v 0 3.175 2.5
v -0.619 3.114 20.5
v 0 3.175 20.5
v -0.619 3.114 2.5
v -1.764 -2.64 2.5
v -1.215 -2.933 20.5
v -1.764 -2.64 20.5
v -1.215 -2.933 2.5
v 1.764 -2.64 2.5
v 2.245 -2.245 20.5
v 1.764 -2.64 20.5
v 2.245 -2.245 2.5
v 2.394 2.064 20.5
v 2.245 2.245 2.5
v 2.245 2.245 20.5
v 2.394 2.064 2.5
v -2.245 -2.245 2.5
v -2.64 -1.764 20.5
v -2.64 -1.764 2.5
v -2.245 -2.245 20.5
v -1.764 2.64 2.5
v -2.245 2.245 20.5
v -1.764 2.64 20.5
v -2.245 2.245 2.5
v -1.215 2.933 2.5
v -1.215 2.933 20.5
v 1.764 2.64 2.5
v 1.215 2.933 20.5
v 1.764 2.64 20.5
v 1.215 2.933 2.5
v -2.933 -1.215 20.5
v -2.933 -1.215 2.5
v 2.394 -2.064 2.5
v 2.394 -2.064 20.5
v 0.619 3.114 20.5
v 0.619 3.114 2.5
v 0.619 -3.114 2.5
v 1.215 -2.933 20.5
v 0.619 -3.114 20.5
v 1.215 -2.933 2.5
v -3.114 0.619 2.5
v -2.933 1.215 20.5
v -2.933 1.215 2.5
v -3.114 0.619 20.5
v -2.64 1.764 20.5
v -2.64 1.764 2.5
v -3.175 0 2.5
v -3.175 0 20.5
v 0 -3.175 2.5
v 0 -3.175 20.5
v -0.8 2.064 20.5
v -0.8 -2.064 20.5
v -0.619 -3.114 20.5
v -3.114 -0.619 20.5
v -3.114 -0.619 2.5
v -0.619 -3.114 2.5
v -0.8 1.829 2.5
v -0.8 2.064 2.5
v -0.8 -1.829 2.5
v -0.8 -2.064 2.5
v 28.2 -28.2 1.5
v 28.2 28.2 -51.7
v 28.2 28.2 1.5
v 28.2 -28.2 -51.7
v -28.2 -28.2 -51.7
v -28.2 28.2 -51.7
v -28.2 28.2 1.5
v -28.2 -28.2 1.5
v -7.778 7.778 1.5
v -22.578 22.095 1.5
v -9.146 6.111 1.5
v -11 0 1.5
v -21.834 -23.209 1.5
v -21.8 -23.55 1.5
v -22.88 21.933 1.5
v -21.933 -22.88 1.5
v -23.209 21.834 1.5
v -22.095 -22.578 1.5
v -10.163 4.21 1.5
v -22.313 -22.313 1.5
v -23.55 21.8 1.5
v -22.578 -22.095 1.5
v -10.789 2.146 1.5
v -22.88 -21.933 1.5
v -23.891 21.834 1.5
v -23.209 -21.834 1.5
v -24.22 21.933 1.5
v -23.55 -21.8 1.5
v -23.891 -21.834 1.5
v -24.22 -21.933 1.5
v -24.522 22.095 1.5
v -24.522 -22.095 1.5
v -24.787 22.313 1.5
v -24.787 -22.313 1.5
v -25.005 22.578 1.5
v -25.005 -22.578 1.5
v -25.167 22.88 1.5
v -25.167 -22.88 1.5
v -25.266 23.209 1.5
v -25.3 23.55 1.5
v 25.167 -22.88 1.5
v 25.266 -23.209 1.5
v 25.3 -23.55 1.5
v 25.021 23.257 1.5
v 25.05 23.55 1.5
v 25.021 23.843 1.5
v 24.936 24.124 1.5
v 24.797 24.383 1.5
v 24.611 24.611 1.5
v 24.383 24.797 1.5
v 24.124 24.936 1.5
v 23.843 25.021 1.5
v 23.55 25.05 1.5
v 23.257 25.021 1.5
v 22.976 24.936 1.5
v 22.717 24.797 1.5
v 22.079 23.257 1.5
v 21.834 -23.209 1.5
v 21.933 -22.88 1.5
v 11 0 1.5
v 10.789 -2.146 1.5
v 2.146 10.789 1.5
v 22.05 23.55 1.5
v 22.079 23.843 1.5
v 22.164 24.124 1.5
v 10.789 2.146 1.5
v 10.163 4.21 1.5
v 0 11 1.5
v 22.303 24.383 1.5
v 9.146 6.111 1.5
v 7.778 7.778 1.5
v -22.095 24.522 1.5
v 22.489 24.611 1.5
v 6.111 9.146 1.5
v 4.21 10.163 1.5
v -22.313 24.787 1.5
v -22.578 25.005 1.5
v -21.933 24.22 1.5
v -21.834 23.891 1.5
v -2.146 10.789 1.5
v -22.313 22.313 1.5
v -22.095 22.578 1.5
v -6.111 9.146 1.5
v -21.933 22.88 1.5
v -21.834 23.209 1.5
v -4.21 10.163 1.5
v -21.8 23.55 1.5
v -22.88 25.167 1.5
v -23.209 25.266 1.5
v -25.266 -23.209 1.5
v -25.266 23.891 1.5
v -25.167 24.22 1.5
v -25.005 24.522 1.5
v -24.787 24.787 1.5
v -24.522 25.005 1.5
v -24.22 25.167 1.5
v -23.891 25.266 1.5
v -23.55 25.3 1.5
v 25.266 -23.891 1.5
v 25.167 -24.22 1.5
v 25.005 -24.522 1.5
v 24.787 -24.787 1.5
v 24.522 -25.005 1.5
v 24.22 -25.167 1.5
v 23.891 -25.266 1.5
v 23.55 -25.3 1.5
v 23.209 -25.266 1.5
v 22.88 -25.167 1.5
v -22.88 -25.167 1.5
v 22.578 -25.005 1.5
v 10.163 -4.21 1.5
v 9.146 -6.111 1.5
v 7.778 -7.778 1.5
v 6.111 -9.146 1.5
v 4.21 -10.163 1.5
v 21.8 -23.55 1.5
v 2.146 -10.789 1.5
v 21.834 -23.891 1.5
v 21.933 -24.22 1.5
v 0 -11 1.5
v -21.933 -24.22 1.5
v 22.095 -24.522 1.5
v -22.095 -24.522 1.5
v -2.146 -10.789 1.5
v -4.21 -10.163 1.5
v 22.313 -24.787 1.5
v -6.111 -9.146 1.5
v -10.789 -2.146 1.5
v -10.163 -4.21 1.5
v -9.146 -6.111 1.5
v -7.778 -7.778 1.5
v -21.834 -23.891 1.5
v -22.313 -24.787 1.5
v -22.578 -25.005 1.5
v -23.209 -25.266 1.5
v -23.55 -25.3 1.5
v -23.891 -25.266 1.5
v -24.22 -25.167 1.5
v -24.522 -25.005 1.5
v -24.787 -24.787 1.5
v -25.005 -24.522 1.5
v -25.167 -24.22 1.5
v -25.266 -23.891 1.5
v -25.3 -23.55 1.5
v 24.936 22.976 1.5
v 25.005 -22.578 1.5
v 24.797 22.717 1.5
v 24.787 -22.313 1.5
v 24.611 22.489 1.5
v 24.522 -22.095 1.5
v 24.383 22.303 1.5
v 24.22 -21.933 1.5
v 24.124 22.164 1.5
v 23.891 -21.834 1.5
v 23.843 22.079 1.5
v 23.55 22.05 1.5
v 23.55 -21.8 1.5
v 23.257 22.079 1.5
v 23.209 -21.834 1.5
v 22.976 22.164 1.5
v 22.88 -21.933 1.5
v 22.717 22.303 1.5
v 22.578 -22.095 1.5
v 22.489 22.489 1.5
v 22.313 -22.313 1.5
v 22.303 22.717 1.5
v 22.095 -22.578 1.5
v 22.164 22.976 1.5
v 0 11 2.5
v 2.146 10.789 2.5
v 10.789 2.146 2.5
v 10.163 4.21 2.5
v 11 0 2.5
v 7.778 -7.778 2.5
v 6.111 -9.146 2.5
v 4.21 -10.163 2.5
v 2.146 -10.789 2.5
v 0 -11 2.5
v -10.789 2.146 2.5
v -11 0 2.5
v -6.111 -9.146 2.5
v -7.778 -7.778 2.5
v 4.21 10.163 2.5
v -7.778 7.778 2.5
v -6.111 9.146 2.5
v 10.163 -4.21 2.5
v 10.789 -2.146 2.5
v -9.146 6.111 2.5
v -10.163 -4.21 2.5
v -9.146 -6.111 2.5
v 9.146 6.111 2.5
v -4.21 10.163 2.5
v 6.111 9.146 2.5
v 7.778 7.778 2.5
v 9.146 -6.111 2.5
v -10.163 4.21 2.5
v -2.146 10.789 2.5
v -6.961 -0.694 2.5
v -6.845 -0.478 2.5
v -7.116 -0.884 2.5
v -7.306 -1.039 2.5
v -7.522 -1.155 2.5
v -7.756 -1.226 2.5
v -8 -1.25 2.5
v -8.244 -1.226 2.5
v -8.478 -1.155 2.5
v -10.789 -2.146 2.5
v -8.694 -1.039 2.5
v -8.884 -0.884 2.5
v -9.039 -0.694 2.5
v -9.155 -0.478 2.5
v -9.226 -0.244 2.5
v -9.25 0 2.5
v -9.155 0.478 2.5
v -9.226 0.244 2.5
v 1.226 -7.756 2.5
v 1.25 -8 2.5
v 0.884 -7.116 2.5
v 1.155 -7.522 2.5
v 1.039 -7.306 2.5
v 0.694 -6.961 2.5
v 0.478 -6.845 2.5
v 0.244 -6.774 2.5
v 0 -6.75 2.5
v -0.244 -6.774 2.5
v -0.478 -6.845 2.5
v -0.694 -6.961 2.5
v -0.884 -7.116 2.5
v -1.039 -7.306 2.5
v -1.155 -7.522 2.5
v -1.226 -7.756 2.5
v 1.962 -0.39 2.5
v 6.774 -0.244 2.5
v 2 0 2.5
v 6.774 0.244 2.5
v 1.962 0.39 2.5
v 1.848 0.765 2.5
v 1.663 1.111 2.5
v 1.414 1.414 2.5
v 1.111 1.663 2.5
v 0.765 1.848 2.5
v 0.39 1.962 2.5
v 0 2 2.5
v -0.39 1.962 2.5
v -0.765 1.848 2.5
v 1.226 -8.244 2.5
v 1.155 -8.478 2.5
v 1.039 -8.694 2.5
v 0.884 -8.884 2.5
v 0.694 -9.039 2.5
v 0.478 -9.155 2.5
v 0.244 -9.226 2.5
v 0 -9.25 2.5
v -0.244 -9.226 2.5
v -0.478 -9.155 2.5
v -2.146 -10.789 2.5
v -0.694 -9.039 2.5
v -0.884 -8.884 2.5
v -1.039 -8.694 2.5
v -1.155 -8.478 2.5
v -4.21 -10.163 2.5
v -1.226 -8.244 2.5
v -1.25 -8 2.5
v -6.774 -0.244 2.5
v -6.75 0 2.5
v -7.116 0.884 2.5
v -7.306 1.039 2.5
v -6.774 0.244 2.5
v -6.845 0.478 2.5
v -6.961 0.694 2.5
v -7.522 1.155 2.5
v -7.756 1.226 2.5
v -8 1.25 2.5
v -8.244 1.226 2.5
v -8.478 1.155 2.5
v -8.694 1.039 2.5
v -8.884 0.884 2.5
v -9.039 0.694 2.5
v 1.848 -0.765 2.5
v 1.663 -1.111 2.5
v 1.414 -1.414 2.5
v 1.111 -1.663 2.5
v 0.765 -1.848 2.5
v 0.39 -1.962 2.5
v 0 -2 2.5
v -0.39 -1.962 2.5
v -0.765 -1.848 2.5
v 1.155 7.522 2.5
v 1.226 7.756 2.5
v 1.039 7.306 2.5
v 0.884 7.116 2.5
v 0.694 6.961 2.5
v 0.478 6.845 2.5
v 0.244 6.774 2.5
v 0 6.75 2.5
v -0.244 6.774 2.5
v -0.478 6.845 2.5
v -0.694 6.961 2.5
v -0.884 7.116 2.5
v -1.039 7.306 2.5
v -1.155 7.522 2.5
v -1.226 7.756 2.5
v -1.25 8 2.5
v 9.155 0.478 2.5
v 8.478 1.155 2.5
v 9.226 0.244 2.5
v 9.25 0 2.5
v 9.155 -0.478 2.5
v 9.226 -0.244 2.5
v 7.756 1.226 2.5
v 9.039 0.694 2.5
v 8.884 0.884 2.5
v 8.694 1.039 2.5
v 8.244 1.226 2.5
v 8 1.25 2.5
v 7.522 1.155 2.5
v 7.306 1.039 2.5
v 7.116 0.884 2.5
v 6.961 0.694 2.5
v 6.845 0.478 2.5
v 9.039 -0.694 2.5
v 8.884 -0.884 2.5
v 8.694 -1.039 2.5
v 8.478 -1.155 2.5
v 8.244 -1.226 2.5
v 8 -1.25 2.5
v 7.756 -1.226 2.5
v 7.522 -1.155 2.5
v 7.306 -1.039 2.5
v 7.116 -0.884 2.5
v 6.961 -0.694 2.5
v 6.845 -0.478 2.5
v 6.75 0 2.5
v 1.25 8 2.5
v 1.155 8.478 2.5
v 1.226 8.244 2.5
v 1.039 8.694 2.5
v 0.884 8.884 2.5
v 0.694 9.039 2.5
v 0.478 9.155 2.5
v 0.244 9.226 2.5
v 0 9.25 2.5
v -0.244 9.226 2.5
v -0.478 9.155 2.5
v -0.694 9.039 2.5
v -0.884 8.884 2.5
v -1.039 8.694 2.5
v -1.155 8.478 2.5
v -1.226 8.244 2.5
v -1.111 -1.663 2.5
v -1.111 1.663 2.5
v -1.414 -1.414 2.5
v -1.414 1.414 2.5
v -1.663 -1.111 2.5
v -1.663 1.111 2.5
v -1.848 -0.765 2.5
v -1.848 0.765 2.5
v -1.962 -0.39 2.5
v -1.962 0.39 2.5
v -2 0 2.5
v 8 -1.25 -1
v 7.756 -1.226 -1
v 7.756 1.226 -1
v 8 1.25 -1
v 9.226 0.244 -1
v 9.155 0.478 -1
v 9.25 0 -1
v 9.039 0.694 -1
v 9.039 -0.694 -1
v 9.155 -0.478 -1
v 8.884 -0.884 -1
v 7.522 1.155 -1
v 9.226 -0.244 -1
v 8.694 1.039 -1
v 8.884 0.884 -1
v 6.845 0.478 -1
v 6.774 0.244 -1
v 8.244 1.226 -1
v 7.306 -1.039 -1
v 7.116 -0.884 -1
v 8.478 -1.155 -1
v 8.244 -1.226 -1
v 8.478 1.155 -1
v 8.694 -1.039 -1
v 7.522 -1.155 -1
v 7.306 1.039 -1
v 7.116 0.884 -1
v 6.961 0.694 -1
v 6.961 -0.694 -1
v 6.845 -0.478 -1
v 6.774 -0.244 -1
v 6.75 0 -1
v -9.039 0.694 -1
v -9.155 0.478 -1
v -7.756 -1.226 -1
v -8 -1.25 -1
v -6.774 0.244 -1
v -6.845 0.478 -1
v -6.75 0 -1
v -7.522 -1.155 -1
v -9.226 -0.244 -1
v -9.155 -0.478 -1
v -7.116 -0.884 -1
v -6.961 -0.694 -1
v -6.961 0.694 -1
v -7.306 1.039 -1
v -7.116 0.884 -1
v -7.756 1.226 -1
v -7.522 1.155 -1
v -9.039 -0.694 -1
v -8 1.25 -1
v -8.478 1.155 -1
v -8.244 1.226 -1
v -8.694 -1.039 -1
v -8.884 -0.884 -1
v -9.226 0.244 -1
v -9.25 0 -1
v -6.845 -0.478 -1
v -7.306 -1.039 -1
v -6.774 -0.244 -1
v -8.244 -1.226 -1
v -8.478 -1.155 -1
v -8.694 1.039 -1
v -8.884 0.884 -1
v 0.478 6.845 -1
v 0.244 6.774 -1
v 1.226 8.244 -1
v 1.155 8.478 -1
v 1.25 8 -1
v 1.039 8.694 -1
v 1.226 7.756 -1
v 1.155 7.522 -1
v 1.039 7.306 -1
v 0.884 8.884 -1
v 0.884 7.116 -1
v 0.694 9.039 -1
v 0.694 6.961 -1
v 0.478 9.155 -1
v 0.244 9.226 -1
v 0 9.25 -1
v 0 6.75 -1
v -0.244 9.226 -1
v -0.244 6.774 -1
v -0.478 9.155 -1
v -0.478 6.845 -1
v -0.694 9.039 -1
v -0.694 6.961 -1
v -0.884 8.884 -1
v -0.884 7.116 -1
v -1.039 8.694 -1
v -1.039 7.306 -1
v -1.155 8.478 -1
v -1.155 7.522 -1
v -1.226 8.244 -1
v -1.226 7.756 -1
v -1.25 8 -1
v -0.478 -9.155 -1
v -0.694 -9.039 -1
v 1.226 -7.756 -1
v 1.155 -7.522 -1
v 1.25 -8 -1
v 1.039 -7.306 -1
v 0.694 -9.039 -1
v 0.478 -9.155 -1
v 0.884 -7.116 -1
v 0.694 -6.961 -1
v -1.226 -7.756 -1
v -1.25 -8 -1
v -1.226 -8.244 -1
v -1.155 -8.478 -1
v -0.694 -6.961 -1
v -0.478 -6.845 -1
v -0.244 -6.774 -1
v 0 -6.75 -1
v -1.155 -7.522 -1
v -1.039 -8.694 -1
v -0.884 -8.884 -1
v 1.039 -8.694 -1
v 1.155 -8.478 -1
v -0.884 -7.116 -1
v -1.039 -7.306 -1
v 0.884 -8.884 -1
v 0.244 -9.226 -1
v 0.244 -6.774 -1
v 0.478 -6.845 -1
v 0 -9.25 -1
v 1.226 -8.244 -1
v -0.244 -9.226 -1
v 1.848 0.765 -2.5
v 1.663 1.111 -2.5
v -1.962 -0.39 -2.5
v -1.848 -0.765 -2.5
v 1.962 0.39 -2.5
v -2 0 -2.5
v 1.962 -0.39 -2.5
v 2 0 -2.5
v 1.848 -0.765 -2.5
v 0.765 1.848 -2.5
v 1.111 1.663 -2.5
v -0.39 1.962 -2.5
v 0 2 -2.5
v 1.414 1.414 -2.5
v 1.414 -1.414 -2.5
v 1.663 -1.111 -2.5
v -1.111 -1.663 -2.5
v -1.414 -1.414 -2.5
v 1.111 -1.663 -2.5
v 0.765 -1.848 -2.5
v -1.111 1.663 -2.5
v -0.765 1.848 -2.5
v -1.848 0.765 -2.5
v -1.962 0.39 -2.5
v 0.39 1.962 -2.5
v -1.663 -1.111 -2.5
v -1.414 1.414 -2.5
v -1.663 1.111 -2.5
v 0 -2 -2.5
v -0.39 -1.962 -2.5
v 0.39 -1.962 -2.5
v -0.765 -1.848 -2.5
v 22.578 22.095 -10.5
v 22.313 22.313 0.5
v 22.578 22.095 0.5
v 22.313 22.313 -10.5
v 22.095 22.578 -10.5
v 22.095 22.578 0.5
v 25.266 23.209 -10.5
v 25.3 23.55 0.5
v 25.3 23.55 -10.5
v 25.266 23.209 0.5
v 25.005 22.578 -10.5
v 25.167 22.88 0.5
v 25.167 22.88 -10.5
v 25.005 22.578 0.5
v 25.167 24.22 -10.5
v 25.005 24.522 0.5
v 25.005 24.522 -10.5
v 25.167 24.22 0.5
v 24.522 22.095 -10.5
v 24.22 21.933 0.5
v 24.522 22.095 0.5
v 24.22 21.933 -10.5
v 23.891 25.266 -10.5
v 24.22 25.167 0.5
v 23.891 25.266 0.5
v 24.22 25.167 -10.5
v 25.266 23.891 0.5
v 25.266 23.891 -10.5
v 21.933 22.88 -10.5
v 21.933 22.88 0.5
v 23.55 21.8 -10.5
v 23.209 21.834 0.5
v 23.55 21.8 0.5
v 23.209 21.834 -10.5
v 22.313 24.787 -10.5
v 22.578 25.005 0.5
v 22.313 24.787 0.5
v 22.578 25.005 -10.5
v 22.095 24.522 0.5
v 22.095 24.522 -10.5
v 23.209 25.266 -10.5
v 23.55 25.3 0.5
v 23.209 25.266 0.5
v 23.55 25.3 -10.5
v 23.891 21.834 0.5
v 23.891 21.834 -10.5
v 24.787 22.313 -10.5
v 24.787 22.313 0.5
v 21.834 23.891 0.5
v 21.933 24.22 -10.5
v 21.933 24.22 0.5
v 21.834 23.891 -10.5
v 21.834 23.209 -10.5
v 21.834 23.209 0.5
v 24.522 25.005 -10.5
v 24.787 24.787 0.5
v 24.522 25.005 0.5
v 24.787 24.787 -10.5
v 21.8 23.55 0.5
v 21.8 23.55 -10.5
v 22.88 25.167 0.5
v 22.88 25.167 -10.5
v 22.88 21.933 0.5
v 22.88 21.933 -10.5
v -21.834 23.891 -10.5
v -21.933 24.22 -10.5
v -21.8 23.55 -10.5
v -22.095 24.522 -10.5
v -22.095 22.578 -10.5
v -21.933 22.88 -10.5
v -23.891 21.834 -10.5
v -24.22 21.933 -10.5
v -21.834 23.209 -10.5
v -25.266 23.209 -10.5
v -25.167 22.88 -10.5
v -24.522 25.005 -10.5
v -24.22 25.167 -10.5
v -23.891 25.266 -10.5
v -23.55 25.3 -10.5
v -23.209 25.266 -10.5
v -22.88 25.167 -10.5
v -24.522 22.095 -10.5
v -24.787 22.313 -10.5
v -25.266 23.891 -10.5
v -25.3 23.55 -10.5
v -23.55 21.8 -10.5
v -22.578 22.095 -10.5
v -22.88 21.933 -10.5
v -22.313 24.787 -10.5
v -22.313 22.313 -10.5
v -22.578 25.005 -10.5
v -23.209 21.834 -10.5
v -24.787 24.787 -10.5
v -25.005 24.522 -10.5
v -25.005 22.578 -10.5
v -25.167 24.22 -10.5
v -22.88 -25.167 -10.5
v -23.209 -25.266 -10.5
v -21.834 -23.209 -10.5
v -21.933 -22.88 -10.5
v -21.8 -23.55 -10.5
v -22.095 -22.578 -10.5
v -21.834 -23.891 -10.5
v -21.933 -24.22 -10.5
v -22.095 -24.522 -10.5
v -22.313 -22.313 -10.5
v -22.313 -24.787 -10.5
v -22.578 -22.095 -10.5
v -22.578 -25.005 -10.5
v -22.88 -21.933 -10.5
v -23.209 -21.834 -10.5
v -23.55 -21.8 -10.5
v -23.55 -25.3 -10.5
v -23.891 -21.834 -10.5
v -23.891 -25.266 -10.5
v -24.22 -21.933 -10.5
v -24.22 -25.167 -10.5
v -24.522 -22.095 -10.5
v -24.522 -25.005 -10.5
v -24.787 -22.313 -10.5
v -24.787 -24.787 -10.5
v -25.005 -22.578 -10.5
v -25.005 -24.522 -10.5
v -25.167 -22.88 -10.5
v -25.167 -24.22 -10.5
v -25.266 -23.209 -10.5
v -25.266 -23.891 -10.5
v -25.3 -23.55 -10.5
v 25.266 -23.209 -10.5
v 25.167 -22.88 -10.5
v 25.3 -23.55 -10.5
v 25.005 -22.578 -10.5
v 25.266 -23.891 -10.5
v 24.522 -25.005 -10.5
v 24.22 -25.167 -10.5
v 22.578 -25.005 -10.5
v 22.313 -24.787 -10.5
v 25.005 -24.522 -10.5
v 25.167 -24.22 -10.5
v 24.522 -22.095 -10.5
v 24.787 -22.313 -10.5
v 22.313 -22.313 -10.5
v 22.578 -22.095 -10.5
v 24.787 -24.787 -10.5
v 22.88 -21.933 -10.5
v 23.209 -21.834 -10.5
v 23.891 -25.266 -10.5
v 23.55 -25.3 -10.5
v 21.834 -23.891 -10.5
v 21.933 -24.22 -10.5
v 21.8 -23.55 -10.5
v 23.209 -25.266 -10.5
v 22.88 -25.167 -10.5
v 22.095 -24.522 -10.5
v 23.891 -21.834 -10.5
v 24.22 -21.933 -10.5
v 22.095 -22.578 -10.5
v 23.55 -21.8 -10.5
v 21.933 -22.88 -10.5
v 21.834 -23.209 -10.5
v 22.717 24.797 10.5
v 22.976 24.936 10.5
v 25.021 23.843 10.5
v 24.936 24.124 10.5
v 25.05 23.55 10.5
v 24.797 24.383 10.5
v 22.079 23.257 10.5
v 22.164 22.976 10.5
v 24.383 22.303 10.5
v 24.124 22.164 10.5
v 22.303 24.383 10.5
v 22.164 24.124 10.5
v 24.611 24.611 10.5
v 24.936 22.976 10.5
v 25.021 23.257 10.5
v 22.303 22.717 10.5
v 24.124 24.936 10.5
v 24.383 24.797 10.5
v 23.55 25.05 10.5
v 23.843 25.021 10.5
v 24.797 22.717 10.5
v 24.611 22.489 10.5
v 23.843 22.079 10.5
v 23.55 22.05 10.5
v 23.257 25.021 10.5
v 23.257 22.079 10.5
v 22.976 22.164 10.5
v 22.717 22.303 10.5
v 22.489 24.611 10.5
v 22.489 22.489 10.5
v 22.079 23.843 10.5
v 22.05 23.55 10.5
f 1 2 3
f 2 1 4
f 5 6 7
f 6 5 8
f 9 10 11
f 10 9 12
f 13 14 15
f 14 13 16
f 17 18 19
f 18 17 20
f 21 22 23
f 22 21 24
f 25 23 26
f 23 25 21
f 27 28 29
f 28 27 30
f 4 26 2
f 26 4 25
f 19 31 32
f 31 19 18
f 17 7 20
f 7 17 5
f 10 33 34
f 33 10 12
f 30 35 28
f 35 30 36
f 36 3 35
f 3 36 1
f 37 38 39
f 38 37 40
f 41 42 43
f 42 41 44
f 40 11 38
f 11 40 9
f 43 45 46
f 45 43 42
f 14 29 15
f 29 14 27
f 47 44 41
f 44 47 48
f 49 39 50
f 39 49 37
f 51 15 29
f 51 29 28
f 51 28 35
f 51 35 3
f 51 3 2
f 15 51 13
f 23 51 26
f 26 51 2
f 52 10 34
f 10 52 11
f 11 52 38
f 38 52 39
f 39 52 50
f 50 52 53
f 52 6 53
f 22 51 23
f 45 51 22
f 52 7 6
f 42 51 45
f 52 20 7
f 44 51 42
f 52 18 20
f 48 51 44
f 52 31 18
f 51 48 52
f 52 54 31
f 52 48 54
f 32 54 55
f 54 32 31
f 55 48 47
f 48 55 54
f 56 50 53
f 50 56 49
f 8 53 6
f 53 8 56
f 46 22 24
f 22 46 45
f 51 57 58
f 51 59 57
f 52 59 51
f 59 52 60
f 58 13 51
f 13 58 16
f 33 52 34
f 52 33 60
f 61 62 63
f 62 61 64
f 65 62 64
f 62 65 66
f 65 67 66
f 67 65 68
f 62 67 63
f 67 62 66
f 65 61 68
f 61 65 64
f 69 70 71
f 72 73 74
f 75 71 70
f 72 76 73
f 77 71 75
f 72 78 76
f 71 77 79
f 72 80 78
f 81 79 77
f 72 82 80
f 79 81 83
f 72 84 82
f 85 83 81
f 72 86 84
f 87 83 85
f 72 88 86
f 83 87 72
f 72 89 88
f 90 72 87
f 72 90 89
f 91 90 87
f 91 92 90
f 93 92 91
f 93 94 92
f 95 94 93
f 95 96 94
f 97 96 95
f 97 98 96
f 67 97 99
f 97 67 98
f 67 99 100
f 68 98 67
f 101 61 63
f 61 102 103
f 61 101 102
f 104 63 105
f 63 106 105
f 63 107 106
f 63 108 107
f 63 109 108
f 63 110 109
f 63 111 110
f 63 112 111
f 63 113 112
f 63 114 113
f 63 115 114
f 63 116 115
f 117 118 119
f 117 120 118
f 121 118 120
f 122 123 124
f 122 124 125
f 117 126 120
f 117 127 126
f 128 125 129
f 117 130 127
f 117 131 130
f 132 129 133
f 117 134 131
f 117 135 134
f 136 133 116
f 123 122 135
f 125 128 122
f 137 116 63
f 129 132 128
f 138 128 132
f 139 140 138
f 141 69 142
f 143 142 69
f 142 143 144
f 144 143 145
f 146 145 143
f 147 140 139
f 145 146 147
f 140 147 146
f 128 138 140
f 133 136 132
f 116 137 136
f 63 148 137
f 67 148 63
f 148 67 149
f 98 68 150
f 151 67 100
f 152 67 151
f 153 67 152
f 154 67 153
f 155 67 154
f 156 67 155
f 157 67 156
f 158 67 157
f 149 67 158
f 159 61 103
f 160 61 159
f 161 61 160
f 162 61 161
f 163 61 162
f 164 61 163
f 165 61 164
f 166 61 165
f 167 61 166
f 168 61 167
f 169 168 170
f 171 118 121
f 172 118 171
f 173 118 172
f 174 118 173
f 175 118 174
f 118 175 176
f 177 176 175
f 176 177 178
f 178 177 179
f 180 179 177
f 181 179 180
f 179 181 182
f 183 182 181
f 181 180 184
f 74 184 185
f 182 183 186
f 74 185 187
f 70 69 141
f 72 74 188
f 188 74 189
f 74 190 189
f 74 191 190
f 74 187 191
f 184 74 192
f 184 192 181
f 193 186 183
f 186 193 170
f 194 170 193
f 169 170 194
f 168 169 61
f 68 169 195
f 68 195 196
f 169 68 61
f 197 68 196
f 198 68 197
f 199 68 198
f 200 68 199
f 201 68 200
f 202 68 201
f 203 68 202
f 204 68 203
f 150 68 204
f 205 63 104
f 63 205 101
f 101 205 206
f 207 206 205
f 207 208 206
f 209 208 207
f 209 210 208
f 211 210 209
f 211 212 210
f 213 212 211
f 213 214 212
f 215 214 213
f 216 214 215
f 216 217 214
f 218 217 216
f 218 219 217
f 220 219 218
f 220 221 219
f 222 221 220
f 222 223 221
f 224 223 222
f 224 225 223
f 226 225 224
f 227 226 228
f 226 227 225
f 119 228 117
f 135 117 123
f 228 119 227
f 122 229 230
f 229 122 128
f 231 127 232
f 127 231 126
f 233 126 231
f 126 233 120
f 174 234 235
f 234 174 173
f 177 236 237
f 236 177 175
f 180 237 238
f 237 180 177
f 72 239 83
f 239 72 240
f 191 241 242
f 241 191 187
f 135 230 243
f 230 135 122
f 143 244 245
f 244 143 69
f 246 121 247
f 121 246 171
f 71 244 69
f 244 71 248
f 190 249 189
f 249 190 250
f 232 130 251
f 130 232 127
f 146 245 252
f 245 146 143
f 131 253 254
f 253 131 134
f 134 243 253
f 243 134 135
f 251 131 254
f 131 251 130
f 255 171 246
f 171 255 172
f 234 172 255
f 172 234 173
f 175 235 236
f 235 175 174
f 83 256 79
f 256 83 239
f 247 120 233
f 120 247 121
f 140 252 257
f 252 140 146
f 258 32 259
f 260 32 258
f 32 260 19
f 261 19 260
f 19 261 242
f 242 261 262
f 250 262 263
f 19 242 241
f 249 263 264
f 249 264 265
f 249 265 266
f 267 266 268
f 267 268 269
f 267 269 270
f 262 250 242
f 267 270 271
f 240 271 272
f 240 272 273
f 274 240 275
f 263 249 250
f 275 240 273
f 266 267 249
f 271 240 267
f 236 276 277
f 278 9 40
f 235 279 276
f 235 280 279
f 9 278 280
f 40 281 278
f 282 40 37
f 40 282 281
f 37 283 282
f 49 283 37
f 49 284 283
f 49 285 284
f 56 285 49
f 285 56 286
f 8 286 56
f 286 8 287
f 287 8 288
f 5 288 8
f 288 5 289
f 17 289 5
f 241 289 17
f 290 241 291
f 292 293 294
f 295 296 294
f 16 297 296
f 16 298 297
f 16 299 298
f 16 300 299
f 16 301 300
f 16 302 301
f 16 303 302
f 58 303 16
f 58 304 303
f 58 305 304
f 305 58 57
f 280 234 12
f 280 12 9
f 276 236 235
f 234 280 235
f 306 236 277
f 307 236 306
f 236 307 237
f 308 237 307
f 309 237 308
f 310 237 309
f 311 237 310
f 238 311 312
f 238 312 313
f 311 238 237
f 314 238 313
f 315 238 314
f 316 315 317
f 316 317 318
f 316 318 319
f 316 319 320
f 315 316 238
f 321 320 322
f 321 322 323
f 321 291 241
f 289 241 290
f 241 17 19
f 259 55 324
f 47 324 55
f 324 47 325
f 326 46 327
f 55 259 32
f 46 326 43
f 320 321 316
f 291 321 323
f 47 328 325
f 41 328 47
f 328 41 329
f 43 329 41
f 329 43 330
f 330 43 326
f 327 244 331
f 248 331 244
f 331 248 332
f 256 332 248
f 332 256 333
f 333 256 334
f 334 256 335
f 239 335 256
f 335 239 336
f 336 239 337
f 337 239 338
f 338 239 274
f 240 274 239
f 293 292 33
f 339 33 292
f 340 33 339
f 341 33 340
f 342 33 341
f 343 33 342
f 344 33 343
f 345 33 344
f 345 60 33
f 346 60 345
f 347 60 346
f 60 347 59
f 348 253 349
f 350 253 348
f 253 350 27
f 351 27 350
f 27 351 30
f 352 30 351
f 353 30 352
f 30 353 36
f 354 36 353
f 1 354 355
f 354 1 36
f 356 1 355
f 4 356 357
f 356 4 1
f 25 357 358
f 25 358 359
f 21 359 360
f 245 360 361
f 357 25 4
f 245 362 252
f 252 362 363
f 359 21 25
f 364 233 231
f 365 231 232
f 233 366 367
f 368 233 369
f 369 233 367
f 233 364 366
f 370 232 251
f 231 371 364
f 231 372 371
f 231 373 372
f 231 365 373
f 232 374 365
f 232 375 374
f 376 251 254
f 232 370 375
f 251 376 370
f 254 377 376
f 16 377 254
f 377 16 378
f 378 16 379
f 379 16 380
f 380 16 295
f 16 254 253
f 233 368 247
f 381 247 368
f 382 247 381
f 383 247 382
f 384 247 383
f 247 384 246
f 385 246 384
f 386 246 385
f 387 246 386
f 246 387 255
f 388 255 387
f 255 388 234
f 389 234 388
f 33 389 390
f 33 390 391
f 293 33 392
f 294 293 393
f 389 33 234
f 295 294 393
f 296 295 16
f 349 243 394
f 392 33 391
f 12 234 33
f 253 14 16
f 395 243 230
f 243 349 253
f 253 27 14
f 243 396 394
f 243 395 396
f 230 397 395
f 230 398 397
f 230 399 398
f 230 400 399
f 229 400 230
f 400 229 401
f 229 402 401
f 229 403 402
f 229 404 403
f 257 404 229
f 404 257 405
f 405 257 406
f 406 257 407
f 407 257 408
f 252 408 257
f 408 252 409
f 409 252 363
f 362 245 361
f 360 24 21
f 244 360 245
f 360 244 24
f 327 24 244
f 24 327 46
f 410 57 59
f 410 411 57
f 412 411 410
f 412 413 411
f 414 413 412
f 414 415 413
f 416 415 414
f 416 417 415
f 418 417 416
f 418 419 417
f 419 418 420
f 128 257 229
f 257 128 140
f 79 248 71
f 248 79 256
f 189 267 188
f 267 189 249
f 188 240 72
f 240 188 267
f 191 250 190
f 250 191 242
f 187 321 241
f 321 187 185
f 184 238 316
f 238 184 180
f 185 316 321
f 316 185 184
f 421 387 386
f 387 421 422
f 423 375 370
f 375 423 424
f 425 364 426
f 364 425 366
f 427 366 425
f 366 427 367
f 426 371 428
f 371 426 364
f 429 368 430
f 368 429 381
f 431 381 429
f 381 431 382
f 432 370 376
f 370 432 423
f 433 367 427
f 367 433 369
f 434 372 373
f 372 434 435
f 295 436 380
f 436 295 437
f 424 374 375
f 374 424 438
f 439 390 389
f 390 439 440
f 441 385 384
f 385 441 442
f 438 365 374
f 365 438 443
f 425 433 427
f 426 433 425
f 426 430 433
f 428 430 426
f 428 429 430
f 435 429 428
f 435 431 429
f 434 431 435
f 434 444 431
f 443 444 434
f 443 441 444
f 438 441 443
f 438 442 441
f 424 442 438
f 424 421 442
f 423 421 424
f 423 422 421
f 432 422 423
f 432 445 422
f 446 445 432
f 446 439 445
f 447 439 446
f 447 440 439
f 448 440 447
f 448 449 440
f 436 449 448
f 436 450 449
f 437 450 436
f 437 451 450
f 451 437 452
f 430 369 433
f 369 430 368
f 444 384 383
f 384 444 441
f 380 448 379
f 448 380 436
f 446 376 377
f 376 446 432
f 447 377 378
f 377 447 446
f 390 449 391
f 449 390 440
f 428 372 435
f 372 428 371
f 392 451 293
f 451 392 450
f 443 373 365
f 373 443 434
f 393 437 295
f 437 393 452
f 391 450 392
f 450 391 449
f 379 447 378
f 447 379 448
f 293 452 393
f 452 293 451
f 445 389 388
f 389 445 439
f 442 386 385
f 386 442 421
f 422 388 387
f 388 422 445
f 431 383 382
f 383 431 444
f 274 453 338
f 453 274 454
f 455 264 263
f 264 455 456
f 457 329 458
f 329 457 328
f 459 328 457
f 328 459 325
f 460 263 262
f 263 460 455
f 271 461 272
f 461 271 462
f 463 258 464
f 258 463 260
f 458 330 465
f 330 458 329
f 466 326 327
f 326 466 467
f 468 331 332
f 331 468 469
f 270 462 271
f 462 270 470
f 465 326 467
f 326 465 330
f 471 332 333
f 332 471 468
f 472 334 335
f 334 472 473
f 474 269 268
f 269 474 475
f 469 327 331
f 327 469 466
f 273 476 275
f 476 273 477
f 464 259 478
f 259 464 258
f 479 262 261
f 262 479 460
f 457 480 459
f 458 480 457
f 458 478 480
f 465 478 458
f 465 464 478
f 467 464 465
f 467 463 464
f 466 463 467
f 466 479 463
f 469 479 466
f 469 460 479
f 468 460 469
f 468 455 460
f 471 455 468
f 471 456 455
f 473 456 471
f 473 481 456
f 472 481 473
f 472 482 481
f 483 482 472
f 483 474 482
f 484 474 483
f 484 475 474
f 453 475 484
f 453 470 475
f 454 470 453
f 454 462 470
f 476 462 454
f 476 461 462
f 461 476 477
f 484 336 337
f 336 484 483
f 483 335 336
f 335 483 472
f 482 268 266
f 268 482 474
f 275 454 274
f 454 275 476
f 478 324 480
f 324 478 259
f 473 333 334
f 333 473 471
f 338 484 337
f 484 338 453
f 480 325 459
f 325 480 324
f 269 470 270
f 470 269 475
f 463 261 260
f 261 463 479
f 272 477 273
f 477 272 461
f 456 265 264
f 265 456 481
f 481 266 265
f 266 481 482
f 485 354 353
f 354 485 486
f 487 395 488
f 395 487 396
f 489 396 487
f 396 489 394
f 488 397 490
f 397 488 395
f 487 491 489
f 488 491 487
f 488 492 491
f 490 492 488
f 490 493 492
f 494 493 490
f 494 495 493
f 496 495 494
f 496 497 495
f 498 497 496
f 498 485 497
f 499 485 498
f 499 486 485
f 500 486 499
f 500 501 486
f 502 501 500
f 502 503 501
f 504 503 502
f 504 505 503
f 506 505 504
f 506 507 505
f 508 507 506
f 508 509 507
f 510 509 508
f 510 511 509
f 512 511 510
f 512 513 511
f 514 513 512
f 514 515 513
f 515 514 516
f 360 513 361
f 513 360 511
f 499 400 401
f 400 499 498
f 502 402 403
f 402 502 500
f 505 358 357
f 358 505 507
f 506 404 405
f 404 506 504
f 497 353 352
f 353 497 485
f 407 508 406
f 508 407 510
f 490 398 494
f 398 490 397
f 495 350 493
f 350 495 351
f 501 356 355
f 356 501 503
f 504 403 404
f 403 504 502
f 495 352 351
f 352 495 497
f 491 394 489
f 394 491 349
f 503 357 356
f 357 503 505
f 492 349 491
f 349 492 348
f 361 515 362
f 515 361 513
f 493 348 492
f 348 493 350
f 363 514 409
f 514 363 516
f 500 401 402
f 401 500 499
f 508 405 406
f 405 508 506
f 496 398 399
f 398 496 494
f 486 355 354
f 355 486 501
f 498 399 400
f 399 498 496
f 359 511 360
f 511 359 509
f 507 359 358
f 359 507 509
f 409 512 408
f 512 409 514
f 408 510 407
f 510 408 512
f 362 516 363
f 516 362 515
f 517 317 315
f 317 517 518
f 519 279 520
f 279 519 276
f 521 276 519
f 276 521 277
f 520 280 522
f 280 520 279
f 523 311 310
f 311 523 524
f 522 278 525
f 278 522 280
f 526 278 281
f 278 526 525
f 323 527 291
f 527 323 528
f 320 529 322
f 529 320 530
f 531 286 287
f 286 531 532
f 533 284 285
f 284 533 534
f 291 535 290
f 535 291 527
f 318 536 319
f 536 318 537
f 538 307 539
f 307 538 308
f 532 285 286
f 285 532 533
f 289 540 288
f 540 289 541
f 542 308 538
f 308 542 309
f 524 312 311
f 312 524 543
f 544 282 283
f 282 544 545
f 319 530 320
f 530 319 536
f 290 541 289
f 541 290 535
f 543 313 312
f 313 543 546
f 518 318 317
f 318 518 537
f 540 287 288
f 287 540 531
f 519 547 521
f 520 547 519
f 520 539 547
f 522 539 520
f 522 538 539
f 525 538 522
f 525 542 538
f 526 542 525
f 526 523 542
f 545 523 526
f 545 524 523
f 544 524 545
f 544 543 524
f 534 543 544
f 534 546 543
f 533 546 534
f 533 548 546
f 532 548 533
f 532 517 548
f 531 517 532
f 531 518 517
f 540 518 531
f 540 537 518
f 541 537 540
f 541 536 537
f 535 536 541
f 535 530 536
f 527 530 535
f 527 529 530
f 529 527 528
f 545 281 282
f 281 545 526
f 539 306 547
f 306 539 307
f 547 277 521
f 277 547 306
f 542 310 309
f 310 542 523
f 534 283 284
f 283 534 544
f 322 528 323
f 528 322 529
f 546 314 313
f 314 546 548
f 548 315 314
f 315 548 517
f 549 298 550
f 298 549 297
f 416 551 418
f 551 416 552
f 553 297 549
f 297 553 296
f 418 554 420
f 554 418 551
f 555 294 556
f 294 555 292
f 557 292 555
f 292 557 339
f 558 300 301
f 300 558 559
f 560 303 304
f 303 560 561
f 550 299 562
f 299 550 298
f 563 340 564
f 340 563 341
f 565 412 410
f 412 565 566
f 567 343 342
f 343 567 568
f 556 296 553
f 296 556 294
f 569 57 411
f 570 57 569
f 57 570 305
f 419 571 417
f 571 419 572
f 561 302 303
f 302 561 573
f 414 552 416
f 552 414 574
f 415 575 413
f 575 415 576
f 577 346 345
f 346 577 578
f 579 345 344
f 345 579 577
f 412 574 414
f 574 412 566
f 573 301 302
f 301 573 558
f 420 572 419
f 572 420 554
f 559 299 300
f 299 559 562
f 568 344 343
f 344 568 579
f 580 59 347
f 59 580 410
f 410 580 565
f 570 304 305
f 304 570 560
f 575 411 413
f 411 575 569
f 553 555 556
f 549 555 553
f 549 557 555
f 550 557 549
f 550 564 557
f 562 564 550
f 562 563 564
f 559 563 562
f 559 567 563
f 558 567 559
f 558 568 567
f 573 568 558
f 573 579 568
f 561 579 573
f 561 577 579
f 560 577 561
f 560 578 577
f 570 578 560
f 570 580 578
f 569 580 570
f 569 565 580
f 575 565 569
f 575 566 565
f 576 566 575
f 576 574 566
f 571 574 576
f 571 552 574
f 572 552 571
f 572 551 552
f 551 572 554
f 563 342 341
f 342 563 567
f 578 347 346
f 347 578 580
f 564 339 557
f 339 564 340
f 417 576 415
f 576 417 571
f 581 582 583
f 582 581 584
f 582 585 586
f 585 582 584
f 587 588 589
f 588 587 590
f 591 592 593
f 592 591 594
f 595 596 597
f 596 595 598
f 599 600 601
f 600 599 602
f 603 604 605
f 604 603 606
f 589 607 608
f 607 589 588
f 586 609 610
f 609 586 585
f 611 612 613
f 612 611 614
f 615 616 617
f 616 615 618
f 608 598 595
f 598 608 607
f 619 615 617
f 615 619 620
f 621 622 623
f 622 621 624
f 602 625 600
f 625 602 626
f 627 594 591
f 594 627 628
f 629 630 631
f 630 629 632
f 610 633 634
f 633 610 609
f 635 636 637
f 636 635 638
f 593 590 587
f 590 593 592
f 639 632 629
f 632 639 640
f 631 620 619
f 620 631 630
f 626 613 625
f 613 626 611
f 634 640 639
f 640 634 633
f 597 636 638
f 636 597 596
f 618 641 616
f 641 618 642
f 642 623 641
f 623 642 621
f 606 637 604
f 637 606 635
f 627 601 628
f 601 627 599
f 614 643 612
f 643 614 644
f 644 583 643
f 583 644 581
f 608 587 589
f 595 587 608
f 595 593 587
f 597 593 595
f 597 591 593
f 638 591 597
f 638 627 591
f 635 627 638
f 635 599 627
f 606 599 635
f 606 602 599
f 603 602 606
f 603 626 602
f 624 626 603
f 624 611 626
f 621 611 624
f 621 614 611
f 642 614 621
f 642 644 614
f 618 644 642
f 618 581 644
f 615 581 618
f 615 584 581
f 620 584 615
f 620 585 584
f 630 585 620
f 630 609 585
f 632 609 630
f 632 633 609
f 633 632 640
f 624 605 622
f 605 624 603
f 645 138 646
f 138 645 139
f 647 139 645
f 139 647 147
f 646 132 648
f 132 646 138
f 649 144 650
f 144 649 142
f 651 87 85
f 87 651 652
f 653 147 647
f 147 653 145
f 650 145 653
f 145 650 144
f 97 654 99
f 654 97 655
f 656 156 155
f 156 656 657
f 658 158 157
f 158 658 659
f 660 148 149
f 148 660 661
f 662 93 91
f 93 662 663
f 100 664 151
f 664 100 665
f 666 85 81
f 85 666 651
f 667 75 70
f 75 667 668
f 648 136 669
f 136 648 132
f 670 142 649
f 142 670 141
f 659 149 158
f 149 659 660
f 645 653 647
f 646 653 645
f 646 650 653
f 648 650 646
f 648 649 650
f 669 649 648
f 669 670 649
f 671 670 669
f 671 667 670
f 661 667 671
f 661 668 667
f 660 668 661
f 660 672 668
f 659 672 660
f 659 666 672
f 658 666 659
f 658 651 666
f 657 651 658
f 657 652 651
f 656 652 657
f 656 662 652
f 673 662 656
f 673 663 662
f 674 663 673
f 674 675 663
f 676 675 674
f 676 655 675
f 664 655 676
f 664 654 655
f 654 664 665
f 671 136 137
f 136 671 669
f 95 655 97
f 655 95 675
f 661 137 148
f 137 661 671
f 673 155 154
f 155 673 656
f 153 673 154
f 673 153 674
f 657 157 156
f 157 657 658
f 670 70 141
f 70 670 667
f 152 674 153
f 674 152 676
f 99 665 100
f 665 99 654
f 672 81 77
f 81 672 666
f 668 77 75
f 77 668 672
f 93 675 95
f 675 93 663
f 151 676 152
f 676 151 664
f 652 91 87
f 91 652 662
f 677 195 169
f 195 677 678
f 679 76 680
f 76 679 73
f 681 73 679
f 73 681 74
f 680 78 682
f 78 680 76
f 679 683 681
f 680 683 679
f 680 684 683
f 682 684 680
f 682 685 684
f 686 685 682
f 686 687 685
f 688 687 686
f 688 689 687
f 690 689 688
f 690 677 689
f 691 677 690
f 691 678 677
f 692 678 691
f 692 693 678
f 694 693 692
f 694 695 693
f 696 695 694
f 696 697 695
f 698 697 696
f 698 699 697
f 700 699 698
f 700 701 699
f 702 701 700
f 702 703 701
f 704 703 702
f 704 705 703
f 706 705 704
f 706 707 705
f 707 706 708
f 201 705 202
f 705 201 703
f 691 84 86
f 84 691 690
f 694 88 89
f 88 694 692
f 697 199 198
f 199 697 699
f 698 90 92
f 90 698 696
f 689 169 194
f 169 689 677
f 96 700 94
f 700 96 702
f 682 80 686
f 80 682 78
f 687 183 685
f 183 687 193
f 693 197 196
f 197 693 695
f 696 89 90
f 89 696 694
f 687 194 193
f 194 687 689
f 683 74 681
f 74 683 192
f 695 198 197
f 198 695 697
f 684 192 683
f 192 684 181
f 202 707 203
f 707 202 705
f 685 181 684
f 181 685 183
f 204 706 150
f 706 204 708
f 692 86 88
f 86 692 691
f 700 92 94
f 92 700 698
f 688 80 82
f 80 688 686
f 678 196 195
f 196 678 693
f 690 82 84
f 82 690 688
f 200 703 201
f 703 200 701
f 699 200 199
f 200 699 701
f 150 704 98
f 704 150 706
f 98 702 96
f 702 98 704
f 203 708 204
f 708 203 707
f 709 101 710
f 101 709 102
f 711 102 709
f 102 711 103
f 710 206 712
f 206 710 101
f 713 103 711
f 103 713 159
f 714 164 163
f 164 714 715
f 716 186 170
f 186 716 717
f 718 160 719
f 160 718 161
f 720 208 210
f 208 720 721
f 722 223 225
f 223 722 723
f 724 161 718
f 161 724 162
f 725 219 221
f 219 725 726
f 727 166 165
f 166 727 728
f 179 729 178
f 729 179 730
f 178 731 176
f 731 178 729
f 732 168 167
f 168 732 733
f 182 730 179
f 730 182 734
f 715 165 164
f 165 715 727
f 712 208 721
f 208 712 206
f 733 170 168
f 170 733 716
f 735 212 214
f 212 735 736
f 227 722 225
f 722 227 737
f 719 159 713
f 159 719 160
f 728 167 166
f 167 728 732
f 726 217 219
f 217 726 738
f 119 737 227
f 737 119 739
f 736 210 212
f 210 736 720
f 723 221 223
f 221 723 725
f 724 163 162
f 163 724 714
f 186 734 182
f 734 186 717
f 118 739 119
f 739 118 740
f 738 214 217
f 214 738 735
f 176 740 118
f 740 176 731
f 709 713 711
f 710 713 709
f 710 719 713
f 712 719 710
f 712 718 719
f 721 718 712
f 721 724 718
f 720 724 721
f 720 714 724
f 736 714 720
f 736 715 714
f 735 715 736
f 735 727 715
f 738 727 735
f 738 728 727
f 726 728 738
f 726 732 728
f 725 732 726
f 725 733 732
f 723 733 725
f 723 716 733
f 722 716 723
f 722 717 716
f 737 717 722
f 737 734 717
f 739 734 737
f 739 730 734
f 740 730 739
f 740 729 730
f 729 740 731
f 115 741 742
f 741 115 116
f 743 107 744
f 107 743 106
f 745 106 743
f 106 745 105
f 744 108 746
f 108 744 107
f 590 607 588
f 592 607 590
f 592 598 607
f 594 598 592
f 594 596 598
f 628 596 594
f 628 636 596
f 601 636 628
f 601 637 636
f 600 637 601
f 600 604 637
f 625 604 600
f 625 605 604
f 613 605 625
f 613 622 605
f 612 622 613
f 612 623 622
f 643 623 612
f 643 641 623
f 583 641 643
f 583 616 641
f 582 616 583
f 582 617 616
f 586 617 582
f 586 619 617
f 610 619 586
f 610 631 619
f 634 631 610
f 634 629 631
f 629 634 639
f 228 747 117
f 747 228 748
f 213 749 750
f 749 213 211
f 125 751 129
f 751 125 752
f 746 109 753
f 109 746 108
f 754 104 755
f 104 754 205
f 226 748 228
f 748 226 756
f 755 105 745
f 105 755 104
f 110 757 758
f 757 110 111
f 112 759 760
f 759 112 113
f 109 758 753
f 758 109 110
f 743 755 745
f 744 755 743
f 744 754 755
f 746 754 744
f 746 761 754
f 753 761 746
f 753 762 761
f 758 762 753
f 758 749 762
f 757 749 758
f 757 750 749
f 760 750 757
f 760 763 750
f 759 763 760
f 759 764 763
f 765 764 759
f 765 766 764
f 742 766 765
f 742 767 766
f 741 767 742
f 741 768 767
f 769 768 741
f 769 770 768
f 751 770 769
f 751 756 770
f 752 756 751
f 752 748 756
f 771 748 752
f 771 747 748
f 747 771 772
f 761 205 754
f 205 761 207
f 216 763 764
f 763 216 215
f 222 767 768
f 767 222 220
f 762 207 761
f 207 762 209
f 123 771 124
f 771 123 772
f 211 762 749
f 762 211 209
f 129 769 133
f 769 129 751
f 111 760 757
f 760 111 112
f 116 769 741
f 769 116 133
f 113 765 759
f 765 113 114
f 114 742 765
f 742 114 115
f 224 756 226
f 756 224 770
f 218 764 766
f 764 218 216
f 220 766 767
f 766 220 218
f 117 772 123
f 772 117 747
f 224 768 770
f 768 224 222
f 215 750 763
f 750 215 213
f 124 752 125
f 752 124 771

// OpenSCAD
// Parameters
face_width = 56.4; //[28.2:112.8:0.1]
face_thickness = 3.0; //[1.5:6.0:0.1]
body_length = 51.2; //[25.6:102.4:0.1]
body_width = 56.4; //[28.2:112.8:0.1]
body_height = 56.4; //[28.2:112.8:0.1]
shaft_diameter = 6.35; //[3.0:12.7:0.05]
shaft_length = 20.0; //[8.0:40.0:0.1]
shaft_boss_diameter = 22.0; //[11.0:44.0:0.1]
shaft_boss_thickness = 2.0; //[1.0:6.0:0.1]
mount_hole_spacing = 47.1; //[23.55:94.2:0.1]
mount_hole_diameter = 3.5; //[2.0:6.0:0.1]
mount_hole_depth = 8.0; //[3.0:20.0:0.1]
overlap = 1.0; //[0.5:2.0:0.1]
grill_hole_diameter = 2.5; //[1.0:6.0:0.1]
grill_hole_spacing = 8.0; //[4.0:16.0:0.1]
grill_hole_depth = 1.5; //[0.5:4.0:0.1]
d_plug_flat_depth = 0.8; //[0.2:2.0:0.05]
d_plug_flat_width_factor = 0.65; //[0.4:0.9:0.01]
screw_shank_diameter = 3.0; //[2.0:5.0:0.1]
screw_length = 10.0; //[5.0:25.0:0.1]
washer_diameter = 7.0; //[4.0:14.0:0.1]
washer_thickness = 1.0; //[0.5:2.5:0.1]

// NEMA motor - complete geometry
module NEMA() {
  color("Black") {
    // Body
    translate([0, 0, -(face_thickness/2 + body_length/2 - overlap)])
      cube([body_width, body_height, body_length], center=true);
    // Front Face
    translate([0, 0, 0])
      cube([face_width, face_width, face_thickness], center=true);
    // Shaft Boss
    translate([0, 0, face_thickness/2 + shaft_boss_thickness/2 - overlap])
      cylinder(r=shaft_boss_diameter/2, h=shaft_boss_thickness, center=true, $fn=32);
    // Shaft
    color("Silver")
    translate([0, 0, face_thickness/2 + shaft_length/2 - overlap])
      difference() {
        cylinder(r=shaft_diameter/2, h=shaft_length, center=true, $fn=32);
        translate([shaft_diameter/2 - d_plug_flat_depth, 0, 0])
          cube([shaft_diameter, shaft_diameter*d_plug_flat_width_factor, shaft_length + 2*overlap], center=true);
      }
  }
}

// Post 4mm Hole
module post_4mm_hole() {
  color("DimGray")
  translate([0, 0, 0])
    cylinder(r=2, h=face_thickness + 2*overlap, center=true, $fn=32);
}

// Screw and Washer
module screw_and_washer() {
  color("Silver")
  translate([mount_hole_spacing/2, mount_hole_spacing/2, face_thickness/2 + screw_length/2 - overlap])
    union() {
      cylinder(r=screw_shank_diameter/2, h=screw_length, center=true, $fn=32);
      translate([0, 0, -screw_length/2 + washer_thickness/2])
        cylinder(r=washer_diameter/2, h=washer_thickness, center=true, $fn=32);
    }
}

// Grill Hole Positions
module grill_hole_positions() {
  color("Black")
  union() {
    translate([grill_hole_spacing, 0, face_thickness/2 - grill_hole_depth/2])
      cylinder(r=grill_hole_diameter/2, h=grill_hole_depth + 2*overlap, center=true, $fn=32);
    translate([-grill_hole_spacing, 0, face_thickness/2 - grill_hole_depth/2])
      cylinder(r=grill_hole_diameter/2, h=grill_hole_depth + 2*overlap, center=true, $fn=32);
    translate([0, grill_hole_spacing, face_thickness/2 - grill_hole_depth/2])
      cylinder(r=grill_hole_diameter/2, h=grill_hole_depth + 2*overlap, center=true, $fn=32);
    translate([0, -grill_hole_spacing, face_thickness/2 - grill_hole_depth/2])
      cylinder(r=grill_hole_diameter/2, h=grill_hole_depth + 2*overlap, center=true, $fn=32);
  }
}

// D Plug D
module d_plug_D() {
  // Placeholder for D Plug D geometry
  // Add detailed geometry as needed
}

// Assembly
module assembly() {
  difference() {
    NEMA();
    union() {
      grill_hole_positions();
      post_4mm_hole();
      translate([mount_hole_spacing/2, mount_hole_spacing/2, -mount_hole_depth/2])
        cylinder(r=mount_hole_diameter/2, h=face_thickness + mount_hole_depth + 2*overlap, center=true, $fn=32);
      translate([-mount_hole_spacing/2, mount_hole_spacing/2, -mount_hole_depth/2])
        cylinder(r=mount_hole_diameter/2, h=face_thickness + mount_hole_depth + 2*overlap, center=true, $fn=32);
      translate([-mount_hole_spacing/2, -mount_hole_spacing/2, -mount_hole_depth/2])
        cylinder(r=mount_hole_diameter/2, h=face_thickness + mount_hole_depth + 2*overlap, center=true, $fn=32);
      translate([mount_hole_spacing/2, -mount_hole_spacing/2, -mount_hole_depth/2])
        cylinder(r=mount_hole_diameter/2, h=face_thickness + mount_hole_depth + 2*overlap, center=true, $fn=32);
    }
  }
  screw_and_washer();
}

assembly();
